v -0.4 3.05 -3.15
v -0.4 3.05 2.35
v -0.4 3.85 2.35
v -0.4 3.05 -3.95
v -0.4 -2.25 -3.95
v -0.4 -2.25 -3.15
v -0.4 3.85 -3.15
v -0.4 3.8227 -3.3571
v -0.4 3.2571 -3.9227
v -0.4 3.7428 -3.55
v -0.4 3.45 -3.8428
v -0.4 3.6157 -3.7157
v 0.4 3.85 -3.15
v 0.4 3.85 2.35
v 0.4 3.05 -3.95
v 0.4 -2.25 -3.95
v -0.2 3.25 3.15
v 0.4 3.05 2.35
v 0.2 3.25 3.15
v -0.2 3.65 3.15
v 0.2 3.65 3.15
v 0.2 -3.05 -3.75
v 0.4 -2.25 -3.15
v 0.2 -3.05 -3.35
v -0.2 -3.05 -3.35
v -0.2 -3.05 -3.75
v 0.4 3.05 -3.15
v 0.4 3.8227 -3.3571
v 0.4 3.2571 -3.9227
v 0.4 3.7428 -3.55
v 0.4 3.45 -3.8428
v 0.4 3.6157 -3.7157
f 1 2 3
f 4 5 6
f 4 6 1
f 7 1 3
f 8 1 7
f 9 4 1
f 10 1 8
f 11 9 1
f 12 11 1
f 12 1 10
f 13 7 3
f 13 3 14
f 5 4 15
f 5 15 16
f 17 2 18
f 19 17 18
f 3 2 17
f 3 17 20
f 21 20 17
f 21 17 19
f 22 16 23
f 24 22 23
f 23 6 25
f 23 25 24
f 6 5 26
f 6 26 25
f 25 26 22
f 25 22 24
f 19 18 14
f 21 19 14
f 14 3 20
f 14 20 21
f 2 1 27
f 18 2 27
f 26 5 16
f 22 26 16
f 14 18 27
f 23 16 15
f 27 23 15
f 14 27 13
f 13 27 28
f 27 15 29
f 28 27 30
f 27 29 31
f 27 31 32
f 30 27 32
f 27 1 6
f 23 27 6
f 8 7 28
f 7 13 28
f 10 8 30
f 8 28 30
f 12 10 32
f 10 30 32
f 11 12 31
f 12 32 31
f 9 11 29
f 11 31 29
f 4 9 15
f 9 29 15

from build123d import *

# Parameters (mm, degrees)
SKETCH_1_W      = 6.9
SKETCH_1_H      = 0.8
EXTRUDE_1_DEPTH = 0.8
SKETCH_2_W      = 0.8
SKETCH_2_H      = 0.8
EXTRUDE_2_DEPTH = 6.3
CHAMFER_1_SIZE  = 0.2
CHAMFER_1_SIZE2 = 0.8
CHAMFER_2_SIZE  = 0.2
CHAMFER_2_SIZE2 = 0.8
FILLET_1_R      = 0.8


with BuildPart() as part:
    # Эскиз1 → Бобышка-Вытянуть1 (new body)
    with BuildSketch(Plane(origin=(-0.4, 0, 0), x_dir=(0, -1, 0), z_dir=(-1, 0, 0))):
        with Locations((-0.4, -3.55)):
            Rectangle(SKETCH_1_W, SKETCH_1_H)
    extrude(amount=-EXTRUDE_1_DEPTH)

    # Эскиз2 → Бобышка-Вытянуть2 (add)
    with BuildSketch(Plane.XY.offset(-3.15)):
        with Locations((0, 3.45)):
            Rectangle(SKETCH_2_W, SKETCH_2_H)
    extrude(amount=EXTRUDE_2_DEPTH)

    # Фаска1
    chamfer_1_edges = [part.edges().sort_by_distance(p)[0] for p in [
        (0, -3.05, -3.15),
        (0.4, -3.05, -3.55),
        (-0.4, -3.05, -3.55),
        (0, -3.05, -3.95),
    ]]
    chamfer_1_side = [part.faces().sort_by_distance(p)[0] for p in [
        (0, -3.05, -3.55),
    ]]
    chamfer(chamfer_1_edges, length=CHAMFER_1_SIZE, length2=CHAMFER_1_SIZE2, reference=chamfer_1_side[0])

    # Фаска2
    chamfer_2_edges = [part.edges().sort_by_distance(p)[0] for p in [
        (0, 3.85, 3.15),
        (0.4, 3.45, 3.15),
        (-0.4, 3.45, 3.15),
        (0, 3.05, 3.15),
    ]]
    chamfer_2_side = [part.faces().sort_by_distance(p)[0] for p in [
        (0, 3.45, 3.15),
    ]]
    chamfer(chamfer_2_edges, length=CHAMFER_2_SIZE, length2=CHAMFER_2_SIZE2, reference=chamfer_2_side[0])

    # Скругление1
    fillet_1_edges = [part.edges().sort_by_distance(p)[0] for p in [
        (0, 3.85, -3.95),
    ]]
    fillet(fillet_1_edges, radius=FILLET_1_R)


solid = part.part
